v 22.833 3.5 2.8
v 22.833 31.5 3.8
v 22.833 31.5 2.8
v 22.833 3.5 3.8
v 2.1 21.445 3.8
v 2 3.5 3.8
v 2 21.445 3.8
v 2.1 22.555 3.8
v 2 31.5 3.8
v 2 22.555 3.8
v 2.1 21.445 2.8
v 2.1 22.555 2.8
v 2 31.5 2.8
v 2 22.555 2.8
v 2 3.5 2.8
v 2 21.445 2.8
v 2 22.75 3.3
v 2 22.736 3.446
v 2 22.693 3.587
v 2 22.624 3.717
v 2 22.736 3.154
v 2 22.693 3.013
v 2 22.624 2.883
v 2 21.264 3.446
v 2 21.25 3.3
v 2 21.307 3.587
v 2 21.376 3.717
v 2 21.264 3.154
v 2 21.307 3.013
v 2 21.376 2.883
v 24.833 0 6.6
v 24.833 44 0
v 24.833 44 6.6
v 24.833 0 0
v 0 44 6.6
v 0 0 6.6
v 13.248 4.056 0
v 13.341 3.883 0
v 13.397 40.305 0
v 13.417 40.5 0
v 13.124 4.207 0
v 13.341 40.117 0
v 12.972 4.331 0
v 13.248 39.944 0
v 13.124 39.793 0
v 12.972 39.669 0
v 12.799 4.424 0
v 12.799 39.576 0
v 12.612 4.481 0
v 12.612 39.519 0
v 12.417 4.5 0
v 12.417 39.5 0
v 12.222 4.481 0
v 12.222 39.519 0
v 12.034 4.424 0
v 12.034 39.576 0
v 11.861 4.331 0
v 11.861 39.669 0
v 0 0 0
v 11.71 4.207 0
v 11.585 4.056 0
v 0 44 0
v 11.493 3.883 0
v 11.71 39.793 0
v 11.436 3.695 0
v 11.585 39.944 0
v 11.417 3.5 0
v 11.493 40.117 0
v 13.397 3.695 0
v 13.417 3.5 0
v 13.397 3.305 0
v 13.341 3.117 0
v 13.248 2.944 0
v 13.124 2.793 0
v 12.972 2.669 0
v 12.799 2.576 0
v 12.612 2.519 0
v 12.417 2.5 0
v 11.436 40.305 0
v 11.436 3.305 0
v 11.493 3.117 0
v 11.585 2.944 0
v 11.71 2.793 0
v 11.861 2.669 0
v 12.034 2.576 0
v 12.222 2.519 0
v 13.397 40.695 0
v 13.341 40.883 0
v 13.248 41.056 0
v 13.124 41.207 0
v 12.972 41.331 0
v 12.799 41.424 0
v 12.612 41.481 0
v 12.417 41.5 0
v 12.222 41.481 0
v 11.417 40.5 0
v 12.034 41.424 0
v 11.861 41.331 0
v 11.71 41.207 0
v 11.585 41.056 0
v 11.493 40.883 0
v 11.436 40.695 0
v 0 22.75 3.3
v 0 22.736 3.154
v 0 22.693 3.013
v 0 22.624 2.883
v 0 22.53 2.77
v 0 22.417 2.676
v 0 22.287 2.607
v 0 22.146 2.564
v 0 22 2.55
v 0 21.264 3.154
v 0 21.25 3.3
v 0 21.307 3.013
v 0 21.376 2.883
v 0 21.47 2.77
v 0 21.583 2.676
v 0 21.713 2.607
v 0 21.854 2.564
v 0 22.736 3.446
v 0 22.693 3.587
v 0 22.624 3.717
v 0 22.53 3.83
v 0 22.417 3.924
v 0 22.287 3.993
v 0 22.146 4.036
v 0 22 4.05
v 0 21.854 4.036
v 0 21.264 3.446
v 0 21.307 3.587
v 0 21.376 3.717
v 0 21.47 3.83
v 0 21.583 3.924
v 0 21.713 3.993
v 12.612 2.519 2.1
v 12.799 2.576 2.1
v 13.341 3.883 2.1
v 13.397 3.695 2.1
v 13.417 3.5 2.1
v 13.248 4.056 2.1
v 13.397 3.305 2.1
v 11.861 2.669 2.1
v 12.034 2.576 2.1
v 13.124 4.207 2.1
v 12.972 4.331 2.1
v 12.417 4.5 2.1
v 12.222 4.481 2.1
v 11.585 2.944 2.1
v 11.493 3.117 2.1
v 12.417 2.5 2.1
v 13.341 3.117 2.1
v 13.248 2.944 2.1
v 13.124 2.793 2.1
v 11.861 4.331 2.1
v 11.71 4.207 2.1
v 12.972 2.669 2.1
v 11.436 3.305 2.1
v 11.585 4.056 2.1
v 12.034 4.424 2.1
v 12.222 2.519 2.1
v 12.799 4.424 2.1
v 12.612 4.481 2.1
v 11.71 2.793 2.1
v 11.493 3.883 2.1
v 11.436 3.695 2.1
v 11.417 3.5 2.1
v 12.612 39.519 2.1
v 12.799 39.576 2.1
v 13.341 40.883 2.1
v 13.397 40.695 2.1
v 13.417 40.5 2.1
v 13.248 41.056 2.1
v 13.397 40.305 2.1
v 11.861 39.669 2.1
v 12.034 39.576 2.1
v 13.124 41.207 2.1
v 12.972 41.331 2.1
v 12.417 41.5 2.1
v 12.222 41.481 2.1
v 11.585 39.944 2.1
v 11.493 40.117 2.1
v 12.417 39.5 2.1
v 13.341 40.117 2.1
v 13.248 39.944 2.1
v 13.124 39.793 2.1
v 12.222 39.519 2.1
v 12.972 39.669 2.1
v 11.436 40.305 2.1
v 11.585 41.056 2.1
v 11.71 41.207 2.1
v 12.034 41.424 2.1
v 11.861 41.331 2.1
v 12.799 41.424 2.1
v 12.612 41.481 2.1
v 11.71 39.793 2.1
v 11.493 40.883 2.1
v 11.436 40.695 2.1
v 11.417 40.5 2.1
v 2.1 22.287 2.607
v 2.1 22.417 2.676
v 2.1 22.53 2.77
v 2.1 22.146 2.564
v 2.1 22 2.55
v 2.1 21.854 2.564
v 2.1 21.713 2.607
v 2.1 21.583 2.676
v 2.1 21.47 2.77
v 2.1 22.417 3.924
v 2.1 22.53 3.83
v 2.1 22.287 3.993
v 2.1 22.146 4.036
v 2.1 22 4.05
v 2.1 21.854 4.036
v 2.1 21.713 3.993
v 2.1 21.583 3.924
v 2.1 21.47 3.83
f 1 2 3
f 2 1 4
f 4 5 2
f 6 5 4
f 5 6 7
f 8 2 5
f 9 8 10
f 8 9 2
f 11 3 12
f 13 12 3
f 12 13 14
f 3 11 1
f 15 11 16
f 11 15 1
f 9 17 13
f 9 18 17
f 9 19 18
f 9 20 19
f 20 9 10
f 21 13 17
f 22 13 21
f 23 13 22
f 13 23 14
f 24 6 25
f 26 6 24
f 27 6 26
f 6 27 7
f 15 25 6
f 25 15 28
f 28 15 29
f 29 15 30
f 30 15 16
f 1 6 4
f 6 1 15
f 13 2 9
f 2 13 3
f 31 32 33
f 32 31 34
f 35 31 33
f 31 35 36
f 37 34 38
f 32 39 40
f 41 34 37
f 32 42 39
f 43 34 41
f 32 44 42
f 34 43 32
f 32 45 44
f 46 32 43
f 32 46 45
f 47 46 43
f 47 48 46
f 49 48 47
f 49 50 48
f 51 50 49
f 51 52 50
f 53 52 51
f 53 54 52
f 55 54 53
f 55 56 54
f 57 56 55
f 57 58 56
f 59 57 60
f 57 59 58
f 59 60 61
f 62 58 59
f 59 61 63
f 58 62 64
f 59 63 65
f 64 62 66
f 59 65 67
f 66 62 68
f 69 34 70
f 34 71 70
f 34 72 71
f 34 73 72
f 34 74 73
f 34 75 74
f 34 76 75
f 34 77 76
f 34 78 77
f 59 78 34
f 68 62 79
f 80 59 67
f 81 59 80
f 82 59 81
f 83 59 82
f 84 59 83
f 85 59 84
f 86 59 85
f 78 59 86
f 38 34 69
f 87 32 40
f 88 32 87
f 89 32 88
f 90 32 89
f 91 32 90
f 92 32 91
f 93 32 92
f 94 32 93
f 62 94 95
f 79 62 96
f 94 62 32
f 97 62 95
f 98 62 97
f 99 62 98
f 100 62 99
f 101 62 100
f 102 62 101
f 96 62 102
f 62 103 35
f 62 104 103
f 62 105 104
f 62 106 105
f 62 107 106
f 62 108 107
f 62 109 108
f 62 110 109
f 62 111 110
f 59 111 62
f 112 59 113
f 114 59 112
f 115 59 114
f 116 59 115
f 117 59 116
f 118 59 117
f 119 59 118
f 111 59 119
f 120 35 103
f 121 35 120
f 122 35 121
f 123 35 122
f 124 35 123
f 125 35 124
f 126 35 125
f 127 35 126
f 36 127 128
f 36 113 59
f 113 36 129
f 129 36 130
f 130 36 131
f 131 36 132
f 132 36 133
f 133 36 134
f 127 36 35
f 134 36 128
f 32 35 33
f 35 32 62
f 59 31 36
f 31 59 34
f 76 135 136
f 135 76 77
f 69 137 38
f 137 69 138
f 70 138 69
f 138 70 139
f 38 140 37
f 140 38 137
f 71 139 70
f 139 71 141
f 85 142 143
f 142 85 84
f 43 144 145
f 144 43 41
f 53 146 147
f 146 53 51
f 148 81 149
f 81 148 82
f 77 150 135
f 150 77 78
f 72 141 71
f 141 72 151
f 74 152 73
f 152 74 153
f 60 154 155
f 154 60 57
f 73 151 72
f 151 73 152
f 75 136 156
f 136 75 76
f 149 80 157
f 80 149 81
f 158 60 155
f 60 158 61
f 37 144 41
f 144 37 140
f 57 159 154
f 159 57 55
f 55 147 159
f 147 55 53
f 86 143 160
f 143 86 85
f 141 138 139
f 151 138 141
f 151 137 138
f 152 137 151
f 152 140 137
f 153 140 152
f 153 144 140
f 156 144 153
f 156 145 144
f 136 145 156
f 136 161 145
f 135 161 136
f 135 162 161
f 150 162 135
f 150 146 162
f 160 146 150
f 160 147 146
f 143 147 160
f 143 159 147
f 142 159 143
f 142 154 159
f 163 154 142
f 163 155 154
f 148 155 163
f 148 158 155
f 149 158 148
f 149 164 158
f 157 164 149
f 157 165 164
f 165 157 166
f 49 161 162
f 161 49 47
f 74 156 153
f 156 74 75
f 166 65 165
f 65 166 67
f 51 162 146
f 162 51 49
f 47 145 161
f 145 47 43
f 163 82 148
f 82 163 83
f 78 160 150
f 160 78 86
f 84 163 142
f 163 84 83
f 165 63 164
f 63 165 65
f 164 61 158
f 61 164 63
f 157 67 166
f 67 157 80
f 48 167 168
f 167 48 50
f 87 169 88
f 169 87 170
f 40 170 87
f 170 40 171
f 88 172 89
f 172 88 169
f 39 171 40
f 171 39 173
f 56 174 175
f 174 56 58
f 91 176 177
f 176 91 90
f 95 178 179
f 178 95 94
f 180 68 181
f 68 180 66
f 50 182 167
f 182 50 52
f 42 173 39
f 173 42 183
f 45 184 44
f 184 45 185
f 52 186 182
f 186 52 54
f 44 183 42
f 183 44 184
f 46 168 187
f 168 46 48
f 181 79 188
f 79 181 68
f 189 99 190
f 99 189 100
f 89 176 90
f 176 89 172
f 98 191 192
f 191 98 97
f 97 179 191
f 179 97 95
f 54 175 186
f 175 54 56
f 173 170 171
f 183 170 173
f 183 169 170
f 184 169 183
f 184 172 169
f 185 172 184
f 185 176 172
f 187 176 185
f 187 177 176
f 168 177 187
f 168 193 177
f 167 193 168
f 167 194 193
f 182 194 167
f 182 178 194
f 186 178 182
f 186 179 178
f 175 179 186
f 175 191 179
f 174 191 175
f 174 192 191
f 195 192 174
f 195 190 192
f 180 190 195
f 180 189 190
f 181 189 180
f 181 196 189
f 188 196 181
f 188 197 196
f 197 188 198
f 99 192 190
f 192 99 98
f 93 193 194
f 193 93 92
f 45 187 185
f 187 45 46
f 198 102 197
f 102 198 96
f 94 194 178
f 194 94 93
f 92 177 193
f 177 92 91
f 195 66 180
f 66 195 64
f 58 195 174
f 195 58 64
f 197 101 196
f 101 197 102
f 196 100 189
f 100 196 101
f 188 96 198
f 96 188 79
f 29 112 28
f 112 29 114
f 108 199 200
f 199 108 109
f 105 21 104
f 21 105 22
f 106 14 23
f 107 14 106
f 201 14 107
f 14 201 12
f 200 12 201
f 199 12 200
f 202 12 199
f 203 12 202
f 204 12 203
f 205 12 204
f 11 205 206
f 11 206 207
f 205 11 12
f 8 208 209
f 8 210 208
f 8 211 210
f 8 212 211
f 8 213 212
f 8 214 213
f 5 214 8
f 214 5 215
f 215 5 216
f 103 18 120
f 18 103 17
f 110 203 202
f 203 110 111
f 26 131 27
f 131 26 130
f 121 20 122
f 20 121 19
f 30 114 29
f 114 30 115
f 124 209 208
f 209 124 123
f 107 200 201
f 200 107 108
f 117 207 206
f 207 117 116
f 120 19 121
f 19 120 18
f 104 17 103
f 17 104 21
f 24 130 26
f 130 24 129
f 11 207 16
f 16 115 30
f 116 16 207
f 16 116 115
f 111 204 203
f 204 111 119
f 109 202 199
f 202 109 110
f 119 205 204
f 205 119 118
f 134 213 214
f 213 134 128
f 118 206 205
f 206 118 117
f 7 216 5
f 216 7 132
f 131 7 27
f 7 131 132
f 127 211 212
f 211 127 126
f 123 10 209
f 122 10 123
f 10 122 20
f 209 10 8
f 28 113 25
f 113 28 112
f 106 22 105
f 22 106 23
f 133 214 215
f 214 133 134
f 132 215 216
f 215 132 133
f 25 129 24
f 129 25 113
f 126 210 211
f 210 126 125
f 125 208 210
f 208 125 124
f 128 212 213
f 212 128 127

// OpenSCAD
/*
 * CUERPO DEL REACTOR DBD (sin electrodos ni accesorios)
 * Para impresión con resina de alta temperatura
 */

// Parámetros (copiados de reactor_3d.scad)
channel_width = 3.0;
channel_height = 1.0;
channel_length = 250;
wall_thickness = 2.0;
n_turns = 6;
turn_radius = 4.5;
dielectric_thickness = 0.8;
inlet_diameter = 2.0;
outlet_diameter = 2.0;
gas_inlet_diameter = 1.5;

$fn = 32;

// Cálculos
straight_length = channel_length / (2 * n_turns);
total_width = straight_length + 2 * wall_thickness;
total_depth = n_turns * (channel_width + wall_thickness * 2) + wall_thickness;
total_height = channel_height + wall_thickness * 2 + dielectric_thickness * 2;

inlet_pos = [wall_thickness + straight_length/2, wall_thickness + channel_width/2, 0];
outlet_pos = [wall_thickness + straight_length/2, total_depth - wall_thickness - channel_width/2, 0];

// Canal serpentín
module serpentine_channel() {
    for (i = [0:n_turns-1]) {
        y_offset = wall_thickness + channel_width/2 + i * (channel_width + wall_thickness);

        translate([wall_thickness, y_offset, wall_thickness + dielectric_thickness])
            cube([straight_length, channel_width, channel_height]);

        if (i < n_turns - 1) {
            translate([wall_thickness + straight_length - turn_radius,
                      y_offset + channel_width/2,
                      wall_thickness + dielectric_thickness])
                cube([turn_radius, channel_width + wall_thickness, channel_height]);

            translate([wall_thickness,
                      y_offset + channel_width,
                      wall_thickness + dielectric_thickness])
                cube([straight_length, wall_thickness, channel_height]);
        }
    }
}

// Cuerpo principal
module reactor_body_only() {
    difference() {
        // Bloque exterior
        cube([total_width, total_depth, total_height]);

        // Canal serpentín
        serpentine_channel();

        // Entrada de líquido
        translate([inlet_pos[0], inlet_pos[1], -0.1])
            cylinder(d = inlet_diameter, h = wall_thickness + 0.2);

        // Salida de líquido
        translate([outlet_pos[0], outlet_pos[1], -0.1])
            cylinder(d = outlet_diameter, h = wall_thickness + 0.2);

        // Entrada de gas
        translate([-0.1, total_depth/2, total_height/2])
            rotate([0, 90, 0])
                cylinder(d = gas_inlet_diameter, h = wall_thickness + 0.2);
    }
}

// Renderizar solo cuerpo
reactor_body_only();

echo("═══════════════════════════════════════════════════════════════");
echo("  CUERPO DEL REACTOR - Para impresión con resina");
echo("═══════════════════════════════════════════════════════════════");
echo(str("  Dimensiones: ", total_width, " x ", total_depth, " x ", total_height, " mm"));
echo(str("  Volumen canal: ", channel_width * channel_height * channel_length / 1000, " mL"));
echo("═══════════════════════════════════════════════════════════════");
